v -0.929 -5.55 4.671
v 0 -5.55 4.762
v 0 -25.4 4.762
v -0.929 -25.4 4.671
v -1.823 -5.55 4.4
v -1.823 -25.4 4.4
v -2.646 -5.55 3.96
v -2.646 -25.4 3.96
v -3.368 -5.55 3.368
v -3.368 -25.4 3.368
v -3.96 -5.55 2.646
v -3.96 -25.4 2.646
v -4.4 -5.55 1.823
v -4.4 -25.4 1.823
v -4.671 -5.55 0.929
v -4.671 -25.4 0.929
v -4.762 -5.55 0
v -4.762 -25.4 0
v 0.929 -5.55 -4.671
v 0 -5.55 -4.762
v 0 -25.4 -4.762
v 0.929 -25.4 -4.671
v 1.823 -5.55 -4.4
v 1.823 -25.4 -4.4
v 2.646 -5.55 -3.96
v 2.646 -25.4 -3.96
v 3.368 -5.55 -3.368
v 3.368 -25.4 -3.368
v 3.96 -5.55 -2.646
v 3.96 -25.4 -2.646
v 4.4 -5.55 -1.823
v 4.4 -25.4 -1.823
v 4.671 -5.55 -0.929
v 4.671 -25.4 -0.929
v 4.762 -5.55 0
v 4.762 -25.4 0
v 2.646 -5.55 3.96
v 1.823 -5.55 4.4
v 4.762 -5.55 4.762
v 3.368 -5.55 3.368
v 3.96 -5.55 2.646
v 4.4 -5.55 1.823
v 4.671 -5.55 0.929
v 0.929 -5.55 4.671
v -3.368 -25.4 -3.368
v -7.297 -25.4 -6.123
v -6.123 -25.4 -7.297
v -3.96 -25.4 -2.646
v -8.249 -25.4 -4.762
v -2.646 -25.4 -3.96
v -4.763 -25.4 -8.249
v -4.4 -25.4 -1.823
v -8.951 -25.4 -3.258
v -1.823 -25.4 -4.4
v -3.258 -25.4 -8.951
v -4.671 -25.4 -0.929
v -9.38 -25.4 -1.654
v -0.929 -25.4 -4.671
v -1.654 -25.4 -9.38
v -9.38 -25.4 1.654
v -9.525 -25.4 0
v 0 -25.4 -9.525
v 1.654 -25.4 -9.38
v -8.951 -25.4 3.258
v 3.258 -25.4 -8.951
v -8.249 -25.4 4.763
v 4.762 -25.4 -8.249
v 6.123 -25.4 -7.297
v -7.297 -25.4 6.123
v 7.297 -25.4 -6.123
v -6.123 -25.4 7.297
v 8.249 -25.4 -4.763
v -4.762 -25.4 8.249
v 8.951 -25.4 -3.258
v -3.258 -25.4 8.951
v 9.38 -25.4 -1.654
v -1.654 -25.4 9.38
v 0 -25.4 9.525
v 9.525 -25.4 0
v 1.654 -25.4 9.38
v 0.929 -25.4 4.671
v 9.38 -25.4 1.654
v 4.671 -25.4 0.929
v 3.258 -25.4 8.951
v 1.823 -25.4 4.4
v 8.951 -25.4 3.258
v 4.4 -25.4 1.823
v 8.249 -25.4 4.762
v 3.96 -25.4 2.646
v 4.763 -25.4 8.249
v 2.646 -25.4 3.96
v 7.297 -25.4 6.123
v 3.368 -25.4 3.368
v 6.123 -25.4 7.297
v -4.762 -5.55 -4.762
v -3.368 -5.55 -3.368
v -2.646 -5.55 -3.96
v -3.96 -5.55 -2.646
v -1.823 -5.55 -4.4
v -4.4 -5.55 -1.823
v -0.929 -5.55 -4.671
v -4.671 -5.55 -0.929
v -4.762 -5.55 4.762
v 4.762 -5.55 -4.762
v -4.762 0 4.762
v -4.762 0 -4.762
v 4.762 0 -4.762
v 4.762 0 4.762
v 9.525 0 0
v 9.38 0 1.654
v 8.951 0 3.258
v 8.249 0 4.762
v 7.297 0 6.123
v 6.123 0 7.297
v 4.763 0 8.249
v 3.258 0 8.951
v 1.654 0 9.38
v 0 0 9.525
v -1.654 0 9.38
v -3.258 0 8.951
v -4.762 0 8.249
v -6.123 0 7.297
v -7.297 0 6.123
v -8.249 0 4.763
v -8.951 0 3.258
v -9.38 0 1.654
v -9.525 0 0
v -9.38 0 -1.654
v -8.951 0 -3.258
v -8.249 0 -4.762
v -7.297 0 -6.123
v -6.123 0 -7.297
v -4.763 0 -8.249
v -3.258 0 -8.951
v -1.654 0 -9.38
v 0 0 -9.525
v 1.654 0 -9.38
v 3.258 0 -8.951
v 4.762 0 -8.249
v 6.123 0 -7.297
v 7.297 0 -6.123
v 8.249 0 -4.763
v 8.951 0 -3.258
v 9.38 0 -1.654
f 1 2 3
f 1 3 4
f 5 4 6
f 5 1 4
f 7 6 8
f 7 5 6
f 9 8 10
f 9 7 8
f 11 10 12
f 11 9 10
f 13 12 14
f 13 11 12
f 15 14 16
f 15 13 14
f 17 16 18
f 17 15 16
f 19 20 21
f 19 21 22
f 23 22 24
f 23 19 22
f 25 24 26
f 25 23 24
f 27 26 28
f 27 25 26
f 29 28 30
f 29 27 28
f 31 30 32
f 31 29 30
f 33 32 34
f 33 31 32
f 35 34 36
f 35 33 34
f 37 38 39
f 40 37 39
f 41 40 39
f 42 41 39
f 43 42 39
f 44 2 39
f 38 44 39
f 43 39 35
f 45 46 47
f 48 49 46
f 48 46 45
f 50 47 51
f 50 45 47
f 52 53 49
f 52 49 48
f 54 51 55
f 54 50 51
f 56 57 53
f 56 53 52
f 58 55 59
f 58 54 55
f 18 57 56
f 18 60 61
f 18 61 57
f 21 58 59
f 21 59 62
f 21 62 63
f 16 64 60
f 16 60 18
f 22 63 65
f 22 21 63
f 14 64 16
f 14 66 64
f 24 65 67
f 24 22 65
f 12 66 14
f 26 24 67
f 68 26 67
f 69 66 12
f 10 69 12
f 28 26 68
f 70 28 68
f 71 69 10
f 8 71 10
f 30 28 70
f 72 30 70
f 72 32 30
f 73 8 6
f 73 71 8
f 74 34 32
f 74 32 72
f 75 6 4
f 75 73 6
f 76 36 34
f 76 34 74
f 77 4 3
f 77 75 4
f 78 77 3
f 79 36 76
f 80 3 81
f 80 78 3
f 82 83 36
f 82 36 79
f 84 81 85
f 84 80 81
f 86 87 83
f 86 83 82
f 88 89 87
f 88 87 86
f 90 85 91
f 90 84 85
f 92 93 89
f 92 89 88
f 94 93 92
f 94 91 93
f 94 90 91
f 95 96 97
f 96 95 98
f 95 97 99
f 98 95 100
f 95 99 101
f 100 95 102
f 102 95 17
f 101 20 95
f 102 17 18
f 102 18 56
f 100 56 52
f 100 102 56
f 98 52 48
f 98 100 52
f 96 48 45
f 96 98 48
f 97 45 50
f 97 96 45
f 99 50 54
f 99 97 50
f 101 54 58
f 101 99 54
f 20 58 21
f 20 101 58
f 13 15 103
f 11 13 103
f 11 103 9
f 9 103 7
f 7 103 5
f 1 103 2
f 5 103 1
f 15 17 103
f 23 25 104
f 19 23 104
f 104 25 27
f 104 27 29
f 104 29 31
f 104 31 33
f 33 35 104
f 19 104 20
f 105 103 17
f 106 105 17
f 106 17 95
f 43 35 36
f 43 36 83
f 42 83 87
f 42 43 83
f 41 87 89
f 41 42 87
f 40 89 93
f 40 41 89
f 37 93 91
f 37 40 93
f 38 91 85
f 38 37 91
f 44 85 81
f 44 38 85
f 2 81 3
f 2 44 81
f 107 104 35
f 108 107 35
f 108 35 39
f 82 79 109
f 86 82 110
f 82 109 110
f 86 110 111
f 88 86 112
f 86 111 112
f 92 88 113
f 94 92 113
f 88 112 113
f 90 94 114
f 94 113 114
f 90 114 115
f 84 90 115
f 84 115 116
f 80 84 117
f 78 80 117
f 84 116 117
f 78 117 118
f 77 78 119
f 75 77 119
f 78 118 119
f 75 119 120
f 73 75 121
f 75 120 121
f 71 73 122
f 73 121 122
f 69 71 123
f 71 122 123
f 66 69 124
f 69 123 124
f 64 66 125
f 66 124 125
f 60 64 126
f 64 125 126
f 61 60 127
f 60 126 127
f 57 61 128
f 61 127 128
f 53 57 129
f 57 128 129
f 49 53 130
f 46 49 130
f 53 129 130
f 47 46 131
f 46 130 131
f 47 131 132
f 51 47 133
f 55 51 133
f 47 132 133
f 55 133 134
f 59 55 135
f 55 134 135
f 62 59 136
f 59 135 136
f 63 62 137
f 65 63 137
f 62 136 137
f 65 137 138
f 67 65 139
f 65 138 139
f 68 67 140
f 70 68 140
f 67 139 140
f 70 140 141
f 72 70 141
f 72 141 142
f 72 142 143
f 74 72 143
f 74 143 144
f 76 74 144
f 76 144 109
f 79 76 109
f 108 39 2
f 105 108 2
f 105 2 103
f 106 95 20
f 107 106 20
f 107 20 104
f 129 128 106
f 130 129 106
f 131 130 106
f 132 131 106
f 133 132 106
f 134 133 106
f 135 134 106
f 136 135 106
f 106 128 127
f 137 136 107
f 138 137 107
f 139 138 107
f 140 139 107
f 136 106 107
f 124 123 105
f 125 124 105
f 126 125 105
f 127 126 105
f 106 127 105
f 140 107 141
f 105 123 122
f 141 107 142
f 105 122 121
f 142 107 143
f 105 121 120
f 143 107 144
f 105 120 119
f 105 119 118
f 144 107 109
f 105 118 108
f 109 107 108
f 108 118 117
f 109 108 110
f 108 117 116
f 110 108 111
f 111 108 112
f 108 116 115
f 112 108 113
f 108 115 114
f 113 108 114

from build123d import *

# Parameters (mm, degrees)
F0_R     = 9.525
F1_DEPTH = 25.4
F3_DEPTH = 25.401
F4_DEPTH = 5.5499


with BuildPart() as f1:
    # F0 (on Front) → F1 (new body)
    with BuildSketch(Plane.XZ):
        Circle(F0_R)
    extrude(amount=F1_DEPTH)

    # F2 (on Front) → F3 (cut, through all)
    with BuildSketch(Plane.XZ):
        with BuildLine():
            ThreePointArc((4.7625, 0), (3.367596, 3.367596), (0, 4.7625))
            ThreePointArc((0, 4.7625), (-3.367596, 3.367596), (-4.7625, 0))
            ThreePointArc((-4.7625, 0), (-3.367596, -3.367596), (0, -4.7625))
            ThreePointArc((0, -4.7625), (3.367596, -3.367596), (4.7625, 0))
        make_face()
    extrude(amount=F3_DEPTH, mode=Mode.SUBTRACT)

    # F2 (on Front) → F4 (cut, symmetric)
    with BuildSketch(Plane.XZ):
        with BuildLine():
            Line((0, 4.7625), (-4.7625, 4.7625))
            Line((-4.7625, 4.7625), (-4.7625, 0))
            ThreePointArc((-4.7625, 0), (-3.367596, 3.367596), (0, 4.7625))
        make_face()
        with BuildLine():
            Line((4.7625, 4.7625), (0, 4.7625))
            ThreePointArc((0, 4.7625), (3.367596, 3.367596), (4.7625, 0))
            Line((4.7625, 0), (4.7625, 4.7625))
        make_face()
        with BuildLine():
            ThreePointArc((0, -4.7625), (-3.367596, -3.367596), (-4.7625, 0))
            Line((-4.7625, 0), (-4.7625, -4.7625))
            Line((-4.7625, -4.7625), (0, -4.7625))
        make_face()
        with BuildLine():
            Line((4.7625, -4.7625), (4.7625, 0))
            ThreePointArc((4.7625, 0), (3.367596, -3.367596), (0, -4.7625))
            Line((0, -4.7625), (4.7625, -4.7625))
        make_face()
    extrude(amount=F4_DEPTH, both=True, mode=Mode.SUBTRACT)


solid = f1.part
